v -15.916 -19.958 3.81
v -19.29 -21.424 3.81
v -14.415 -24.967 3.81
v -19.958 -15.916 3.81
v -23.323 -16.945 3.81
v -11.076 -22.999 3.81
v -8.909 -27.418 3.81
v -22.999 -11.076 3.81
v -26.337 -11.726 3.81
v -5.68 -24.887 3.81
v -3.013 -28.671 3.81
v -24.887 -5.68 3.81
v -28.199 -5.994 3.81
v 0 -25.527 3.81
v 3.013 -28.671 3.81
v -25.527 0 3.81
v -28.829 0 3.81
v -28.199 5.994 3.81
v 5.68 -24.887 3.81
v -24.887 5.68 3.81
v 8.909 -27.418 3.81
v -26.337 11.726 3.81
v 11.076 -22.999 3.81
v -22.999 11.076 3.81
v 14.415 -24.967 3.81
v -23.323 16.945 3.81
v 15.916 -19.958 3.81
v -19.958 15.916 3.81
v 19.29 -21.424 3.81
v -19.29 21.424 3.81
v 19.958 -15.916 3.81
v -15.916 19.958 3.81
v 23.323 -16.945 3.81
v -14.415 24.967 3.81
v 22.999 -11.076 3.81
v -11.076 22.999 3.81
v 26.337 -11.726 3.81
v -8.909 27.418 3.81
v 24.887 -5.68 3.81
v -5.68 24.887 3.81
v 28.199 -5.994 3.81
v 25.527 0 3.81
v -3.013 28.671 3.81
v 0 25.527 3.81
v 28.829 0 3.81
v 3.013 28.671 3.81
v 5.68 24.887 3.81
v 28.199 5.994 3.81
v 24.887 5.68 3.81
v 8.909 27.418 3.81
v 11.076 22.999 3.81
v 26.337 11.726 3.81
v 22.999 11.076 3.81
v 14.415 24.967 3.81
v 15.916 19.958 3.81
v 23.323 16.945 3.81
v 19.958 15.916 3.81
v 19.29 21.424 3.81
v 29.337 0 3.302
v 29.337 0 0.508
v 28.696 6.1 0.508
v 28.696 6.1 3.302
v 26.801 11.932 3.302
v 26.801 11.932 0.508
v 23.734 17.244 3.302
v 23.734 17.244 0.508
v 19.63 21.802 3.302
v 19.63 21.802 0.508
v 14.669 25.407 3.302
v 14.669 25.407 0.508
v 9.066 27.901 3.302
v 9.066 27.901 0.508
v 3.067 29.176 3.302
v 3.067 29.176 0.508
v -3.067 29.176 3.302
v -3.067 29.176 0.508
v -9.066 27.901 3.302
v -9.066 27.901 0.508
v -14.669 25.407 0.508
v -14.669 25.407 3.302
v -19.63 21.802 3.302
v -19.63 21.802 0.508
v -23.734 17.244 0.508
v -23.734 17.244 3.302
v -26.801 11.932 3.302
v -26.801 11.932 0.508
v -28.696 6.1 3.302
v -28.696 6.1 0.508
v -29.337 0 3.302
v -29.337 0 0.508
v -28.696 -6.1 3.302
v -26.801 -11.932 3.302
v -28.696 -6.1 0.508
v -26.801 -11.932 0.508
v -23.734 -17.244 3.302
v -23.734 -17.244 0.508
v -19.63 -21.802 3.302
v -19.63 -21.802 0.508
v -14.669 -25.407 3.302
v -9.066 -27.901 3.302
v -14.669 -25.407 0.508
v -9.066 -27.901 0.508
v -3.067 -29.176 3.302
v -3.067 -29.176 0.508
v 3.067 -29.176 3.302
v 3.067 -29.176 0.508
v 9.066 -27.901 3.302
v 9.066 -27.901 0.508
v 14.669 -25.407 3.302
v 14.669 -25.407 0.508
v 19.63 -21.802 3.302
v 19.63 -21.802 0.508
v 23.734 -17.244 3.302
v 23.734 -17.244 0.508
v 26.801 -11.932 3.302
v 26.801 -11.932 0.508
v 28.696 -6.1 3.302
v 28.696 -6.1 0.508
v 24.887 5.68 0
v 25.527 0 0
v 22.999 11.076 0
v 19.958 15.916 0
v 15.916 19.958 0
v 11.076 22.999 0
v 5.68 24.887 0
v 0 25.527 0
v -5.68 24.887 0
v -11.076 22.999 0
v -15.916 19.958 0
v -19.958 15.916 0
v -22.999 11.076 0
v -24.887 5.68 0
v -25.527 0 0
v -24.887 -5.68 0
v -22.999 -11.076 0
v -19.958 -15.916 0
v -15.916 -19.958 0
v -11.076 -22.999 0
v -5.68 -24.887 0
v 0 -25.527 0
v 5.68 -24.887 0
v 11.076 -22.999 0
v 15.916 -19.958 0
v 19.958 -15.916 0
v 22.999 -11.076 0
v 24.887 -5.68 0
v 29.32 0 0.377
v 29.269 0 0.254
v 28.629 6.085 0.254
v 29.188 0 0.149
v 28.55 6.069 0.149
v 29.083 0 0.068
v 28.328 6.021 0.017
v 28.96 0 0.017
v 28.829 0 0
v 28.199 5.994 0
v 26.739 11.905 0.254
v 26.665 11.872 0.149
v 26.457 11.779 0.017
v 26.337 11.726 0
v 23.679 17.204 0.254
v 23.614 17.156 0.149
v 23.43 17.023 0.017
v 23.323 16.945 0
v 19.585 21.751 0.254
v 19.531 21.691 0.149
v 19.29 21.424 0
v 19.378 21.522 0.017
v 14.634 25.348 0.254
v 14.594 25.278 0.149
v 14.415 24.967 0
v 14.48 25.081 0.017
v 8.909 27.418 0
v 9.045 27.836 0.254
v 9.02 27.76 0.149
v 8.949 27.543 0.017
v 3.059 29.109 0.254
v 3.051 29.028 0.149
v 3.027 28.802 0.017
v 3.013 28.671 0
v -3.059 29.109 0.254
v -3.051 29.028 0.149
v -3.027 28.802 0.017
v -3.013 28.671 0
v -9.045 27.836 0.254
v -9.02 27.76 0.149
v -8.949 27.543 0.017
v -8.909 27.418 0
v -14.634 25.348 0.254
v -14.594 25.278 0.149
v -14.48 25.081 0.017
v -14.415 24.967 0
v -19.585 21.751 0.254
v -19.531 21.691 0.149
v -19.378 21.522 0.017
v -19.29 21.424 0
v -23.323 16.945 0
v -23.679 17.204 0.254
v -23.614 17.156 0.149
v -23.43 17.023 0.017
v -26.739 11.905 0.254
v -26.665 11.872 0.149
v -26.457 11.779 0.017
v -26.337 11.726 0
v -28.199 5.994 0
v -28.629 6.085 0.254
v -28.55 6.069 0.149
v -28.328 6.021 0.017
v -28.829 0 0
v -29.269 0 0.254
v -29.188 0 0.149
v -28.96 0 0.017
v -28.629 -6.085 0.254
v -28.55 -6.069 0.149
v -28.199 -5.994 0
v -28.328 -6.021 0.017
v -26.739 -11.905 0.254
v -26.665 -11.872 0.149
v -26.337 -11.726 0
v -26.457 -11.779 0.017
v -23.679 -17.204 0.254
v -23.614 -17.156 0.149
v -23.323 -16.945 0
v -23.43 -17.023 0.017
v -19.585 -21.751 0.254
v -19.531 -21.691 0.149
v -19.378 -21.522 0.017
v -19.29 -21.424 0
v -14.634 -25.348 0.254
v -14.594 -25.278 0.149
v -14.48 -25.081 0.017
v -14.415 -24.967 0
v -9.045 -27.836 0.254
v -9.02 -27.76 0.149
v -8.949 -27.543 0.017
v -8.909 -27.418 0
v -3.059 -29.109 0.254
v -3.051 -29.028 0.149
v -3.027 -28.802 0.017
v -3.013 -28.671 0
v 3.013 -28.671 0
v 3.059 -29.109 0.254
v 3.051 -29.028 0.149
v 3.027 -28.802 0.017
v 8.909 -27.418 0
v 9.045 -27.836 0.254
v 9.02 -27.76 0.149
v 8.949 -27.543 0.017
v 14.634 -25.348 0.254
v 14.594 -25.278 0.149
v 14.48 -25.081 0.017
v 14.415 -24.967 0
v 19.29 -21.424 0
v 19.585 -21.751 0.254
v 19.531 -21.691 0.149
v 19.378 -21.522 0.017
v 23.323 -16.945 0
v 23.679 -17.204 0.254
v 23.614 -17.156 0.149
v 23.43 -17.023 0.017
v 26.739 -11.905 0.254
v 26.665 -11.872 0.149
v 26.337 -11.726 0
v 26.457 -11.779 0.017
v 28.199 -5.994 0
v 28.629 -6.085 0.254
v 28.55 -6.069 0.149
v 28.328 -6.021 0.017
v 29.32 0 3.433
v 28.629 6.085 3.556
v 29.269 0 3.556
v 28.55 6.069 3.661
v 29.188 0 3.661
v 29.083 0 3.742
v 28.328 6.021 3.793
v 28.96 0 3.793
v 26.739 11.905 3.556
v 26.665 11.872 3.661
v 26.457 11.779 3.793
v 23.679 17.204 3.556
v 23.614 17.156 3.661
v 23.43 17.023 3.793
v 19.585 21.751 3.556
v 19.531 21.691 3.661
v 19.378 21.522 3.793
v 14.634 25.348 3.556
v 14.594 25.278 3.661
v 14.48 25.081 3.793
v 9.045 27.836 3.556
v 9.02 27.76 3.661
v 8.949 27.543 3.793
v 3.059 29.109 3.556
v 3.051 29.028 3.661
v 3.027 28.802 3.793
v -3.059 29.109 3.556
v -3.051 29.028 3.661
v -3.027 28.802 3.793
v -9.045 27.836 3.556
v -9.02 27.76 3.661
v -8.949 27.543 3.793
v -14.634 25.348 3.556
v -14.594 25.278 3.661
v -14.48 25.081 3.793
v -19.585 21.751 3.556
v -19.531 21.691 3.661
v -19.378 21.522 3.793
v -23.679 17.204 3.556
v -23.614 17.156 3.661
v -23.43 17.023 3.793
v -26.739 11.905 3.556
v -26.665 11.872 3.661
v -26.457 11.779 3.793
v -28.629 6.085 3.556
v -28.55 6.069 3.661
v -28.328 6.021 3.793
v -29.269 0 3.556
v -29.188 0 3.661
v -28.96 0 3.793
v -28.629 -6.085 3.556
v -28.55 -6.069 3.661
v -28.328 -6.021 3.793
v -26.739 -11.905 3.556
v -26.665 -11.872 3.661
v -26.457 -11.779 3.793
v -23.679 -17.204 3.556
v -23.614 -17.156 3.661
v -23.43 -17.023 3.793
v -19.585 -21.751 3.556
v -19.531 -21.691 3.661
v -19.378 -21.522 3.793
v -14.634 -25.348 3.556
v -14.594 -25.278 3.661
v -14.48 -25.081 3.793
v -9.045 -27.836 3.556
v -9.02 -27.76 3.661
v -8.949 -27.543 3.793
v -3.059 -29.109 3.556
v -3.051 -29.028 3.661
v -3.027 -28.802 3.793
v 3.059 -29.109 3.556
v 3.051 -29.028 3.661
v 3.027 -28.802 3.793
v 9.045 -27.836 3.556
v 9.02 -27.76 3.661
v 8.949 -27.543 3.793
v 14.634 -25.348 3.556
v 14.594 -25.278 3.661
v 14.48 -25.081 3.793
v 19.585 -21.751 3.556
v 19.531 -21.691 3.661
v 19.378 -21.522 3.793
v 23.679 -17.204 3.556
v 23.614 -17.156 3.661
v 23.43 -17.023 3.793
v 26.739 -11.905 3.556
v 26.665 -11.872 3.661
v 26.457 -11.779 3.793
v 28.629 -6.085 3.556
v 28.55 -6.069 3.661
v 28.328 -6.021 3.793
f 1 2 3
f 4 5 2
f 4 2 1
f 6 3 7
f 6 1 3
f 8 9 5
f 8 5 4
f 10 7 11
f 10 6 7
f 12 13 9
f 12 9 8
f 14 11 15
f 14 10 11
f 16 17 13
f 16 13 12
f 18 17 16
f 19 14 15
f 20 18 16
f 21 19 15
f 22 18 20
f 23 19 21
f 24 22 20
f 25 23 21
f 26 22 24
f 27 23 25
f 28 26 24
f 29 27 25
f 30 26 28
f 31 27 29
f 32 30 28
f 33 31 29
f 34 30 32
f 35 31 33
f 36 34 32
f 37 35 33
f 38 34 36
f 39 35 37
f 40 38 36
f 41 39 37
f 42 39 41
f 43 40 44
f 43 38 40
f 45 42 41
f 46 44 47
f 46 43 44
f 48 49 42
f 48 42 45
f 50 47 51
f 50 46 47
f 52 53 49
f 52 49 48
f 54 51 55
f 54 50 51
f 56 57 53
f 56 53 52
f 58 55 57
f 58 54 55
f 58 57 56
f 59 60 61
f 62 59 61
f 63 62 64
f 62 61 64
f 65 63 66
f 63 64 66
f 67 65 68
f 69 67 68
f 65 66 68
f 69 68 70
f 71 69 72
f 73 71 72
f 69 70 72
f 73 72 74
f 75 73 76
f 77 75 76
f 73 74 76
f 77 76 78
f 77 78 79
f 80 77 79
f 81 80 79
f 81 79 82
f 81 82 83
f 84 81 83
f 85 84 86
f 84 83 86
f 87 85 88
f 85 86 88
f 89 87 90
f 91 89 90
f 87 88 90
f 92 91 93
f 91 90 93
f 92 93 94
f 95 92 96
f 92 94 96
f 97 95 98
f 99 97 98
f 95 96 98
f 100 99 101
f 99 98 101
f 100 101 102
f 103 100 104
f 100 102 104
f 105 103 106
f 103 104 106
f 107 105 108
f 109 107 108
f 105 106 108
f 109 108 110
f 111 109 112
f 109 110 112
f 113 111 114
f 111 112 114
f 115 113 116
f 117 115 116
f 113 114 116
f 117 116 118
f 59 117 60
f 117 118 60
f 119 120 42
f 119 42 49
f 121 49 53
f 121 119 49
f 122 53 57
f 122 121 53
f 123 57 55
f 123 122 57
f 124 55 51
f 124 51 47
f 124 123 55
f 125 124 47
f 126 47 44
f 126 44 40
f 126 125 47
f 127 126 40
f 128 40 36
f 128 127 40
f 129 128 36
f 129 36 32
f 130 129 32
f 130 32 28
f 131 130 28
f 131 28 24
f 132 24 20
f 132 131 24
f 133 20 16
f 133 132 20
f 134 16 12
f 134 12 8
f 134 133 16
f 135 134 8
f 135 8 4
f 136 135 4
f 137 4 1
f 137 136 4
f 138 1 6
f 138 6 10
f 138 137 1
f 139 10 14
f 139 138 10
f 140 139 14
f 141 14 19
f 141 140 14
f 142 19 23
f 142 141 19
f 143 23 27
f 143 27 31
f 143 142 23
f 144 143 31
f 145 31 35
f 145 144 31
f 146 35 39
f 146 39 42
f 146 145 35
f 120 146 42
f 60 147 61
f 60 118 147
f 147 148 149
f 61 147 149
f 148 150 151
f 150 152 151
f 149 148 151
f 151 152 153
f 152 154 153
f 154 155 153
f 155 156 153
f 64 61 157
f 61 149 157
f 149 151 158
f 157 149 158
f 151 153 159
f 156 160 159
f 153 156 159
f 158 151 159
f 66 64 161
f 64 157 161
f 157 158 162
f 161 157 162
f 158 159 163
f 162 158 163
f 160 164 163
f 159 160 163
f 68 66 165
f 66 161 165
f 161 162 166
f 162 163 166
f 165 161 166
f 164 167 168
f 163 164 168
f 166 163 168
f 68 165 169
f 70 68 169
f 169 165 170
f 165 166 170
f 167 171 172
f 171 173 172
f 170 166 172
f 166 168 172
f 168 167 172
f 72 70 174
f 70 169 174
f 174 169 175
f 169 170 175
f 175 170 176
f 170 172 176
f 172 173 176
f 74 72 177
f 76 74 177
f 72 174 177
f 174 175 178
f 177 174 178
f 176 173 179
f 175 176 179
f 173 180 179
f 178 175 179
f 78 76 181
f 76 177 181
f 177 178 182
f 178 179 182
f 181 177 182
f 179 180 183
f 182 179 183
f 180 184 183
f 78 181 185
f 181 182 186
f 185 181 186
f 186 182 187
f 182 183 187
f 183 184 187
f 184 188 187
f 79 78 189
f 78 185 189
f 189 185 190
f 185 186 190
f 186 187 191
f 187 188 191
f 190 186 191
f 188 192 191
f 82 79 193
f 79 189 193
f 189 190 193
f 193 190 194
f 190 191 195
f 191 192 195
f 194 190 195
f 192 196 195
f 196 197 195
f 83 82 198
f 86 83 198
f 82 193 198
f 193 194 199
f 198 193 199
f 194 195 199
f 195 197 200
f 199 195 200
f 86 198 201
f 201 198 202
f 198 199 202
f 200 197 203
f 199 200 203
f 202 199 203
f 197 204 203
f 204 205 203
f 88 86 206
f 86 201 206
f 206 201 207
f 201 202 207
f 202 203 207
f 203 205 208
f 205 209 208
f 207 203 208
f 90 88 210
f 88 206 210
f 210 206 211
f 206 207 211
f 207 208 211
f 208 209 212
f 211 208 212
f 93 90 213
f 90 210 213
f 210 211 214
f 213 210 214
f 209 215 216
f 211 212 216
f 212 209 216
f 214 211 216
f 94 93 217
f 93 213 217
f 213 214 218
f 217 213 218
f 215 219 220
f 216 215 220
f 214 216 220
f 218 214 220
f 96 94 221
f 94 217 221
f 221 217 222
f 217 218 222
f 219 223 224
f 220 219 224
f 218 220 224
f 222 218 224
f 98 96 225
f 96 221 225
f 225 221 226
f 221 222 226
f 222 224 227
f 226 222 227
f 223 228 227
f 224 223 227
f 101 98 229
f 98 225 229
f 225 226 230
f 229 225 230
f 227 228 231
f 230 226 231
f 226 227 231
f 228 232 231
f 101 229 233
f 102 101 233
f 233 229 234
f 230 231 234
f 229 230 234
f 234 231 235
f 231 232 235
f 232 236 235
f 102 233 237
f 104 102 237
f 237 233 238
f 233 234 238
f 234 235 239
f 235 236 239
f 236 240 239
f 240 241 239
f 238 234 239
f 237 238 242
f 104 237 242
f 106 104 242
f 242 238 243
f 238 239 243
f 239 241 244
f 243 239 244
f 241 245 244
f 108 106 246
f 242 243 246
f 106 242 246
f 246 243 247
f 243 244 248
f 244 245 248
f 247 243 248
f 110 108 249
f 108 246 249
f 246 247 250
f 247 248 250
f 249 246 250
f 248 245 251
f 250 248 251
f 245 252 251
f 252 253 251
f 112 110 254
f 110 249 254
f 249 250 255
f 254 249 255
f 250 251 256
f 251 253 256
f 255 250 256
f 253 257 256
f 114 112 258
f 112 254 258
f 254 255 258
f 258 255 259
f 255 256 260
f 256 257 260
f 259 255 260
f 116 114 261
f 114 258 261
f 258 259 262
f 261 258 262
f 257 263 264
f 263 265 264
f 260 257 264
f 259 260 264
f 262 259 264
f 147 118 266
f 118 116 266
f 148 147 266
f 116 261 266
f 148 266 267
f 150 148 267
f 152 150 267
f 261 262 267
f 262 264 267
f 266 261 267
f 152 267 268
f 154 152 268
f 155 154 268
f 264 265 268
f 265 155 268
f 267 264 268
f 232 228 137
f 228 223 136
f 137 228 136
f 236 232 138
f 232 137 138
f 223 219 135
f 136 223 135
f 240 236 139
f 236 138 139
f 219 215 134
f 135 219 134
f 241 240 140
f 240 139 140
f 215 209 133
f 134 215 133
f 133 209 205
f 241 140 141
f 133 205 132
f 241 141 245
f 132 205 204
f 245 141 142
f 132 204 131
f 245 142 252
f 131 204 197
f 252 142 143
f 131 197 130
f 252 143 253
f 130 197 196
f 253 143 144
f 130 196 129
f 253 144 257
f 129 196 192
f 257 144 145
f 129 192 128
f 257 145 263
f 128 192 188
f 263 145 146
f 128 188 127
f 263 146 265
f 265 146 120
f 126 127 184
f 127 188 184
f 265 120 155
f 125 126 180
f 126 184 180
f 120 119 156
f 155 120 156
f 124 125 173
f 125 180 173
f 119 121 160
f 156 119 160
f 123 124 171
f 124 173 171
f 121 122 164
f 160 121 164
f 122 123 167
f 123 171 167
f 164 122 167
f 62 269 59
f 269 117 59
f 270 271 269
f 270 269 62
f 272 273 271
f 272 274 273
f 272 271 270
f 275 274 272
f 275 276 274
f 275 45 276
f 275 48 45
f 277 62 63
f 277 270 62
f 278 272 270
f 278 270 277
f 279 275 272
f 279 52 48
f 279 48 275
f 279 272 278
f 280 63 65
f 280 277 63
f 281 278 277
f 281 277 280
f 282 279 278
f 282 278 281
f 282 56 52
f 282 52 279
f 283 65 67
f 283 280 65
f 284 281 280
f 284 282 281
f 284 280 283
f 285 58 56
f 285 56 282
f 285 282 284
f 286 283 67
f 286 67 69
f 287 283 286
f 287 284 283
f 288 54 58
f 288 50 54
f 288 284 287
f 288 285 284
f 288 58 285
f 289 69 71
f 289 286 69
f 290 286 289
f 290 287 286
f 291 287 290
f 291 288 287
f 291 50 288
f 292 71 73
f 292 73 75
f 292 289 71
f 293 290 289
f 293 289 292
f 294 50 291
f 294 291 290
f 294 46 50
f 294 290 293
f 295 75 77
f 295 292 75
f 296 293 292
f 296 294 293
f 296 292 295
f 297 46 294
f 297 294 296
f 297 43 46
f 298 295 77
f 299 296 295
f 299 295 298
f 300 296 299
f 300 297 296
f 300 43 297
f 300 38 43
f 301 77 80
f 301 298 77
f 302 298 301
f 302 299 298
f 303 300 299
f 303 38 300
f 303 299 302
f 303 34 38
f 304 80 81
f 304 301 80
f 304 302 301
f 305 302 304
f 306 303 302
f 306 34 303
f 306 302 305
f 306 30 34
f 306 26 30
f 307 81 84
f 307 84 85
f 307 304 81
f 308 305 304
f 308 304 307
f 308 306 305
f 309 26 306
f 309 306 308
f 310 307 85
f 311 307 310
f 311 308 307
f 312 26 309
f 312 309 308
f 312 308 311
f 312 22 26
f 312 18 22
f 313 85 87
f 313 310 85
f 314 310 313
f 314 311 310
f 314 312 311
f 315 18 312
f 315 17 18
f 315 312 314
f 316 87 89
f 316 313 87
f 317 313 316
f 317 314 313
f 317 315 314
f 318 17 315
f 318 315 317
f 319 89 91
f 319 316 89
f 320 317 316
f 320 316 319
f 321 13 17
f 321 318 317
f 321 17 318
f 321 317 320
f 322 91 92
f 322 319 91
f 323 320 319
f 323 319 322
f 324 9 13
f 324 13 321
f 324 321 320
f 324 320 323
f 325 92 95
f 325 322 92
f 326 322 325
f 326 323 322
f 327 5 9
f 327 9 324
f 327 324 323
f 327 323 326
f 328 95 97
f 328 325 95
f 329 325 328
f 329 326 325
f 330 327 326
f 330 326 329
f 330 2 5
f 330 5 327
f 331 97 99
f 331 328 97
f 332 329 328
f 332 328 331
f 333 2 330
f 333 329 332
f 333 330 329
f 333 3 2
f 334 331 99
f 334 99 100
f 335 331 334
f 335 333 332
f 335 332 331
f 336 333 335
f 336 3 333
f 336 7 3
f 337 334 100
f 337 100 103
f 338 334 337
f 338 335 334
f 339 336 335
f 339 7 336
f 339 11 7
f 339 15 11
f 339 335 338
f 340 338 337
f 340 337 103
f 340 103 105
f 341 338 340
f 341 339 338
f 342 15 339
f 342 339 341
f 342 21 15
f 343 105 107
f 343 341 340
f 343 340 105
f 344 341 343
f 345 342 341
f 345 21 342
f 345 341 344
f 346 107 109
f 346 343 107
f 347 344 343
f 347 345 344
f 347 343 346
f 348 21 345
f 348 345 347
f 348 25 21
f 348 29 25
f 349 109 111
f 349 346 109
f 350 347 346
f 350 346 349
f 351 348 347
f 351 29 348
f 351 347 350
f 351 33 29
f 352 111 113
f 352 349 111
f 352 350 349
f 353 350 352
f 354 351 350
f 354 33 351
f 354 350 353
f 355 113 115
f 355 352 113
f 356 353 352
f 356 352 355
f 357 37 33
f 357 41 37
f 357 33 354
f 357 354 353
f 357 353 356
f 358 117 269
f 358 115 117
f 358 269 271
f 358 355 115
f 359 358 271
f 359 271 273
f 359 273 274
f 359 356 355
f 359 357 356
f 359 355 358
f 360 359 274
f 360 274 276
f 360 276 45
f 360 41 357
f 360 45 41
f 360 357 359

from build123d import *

# Parameters (mm, degrees)
F0_R     = 29.337
F0_R_2   = 25.527
F1_DEPTH = 3.81
F2_R     = 0.508
F3_R     = 0.508


with BuildPart() as f1:
    # F0 (on Top) → F1 (new body)
    with BuildSketch(Plane.XY):
        Circle(F0_R)
        Circle(F0_R_2, mode=Mode.SUBTRACT)
    extrude(amount=F1_DEPTH)

    # F2
    f2_edges = [f1.edges().sort_by_distance(p)[0] for p in [
        (-29.337, 0, 3.81),
    ]]
    fillet(f2_edges, radius=F2_R)

    # F3
    f3_edges = [f1.edges().sort_by_distance(p)[0] for p in [
        (-29.337, 0, 0),
    ]]
    fillet(f3_edges, radius=F3_R)


solid = f1.part
